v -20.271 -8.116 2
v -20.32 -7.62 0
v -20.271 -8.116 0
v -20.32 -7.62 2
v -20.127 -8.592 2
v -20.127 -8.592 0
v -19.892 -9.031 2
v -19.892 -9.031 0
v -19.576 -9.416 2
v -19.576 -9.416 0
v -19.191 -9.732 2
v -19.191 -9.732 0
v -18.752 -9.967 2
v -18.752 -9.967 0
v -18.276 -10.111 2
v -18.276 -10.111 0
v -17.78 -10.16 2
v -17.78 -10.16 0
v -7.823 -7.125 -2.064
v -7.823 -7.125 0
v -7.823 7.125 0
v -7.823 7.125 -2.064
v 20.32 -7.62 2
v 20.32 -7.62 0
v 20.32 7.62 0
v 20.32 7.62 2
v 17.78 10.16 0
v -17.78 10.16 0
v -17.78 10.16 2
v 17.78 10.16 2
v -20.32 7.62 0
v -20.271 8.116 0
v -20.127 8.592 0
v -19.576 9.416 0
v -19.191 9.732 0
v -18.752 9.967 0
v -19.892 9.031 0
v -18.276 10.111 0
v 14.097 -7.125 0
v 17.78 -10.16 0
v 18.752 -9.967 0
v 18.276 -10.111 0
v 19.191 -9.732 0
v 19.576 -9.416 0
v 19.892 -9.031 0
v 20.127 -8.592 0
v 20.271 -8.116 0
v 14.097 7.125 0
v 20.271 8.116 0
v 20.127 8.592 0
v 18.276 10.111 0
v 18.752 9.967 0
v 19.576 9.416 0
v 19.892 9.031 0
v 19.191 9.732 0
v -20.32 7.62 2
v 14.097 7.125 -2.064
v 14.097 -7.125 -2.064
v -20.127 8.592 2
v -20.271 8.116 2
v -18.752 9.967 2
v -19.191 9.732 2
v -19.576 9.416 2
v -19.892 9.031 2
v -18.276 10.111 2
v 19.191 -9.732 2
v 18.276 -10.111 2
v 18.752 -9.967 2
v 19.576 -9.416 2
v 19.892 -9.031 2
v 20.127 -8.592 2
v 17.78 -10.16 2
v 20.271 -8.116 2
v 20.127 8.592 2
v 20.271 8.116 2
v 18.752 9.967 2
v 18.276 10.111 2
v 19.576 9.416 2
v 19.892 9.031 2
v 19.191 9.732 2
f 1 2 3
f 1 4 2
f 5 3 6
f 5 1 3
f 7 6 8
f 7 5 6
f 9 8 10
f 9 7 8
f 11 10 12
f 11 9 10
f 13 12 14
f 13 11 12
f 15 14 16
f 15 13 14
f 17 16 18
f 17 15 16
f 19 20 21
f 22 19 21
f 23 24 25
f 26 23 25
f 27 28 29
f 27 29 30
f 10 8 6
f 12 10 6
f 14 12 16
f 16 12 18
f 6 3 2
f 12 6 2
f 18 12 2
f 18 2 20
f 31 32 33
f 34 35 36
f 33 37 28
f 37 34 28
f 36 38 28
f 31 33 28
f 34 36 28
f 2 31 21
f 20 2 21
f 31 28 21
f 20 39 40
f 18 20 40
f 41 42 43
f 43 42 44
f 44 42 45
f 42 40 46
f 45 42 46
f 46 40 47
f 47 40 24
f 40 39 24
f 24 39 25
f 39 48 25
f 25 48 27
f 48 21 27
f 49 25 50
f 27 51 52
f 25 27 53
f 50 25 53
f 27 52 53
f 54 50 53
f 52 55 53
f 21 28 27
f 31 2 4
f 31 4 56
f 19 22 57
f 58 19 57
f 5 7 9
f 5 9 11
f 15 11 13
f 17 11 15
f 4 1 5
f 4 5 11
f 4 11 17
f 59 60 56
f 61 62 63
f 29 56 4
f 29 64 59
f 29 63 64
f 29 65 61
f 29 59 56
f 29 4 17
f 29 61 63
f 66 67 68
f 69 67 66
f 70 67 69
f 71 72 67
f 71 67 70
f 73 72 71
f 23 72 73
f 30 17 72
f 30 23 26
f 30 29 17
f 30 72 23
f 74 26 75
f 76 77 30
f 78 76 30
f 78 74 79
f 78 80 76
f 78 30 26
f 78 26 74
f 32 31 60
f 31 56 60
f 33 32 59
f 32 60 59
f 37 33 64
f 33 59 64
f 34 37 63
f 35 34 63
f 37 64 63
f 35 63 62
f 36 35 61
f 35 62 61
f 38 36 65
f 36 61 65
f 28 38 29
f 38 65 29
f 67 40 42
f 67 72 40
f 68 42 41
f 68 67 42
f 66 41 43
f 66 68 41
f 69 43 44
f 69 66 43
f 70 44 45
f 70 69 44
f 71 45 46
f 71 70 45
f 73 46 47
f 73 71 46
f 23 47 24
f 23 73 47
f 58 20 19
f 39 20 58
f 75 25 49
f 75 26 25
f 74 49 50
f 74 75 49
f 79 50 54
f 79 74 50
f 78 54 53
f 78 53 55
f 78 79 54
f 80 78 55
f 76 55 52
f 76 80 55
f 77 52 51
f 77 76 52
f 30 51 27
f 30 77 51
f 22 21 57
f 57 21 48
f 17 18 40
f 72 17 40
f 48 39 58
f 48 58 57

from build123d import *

# Parameters (mm, degrees)
SKETCH1_W           = 40.64
SKETCH1_H           = 20.32
BOSS_EXTRUDE1_DEPTH = 2
FILLET1_R           = 2.54
SKETCH3_W           = 21.9202
SKETCH3_H           = 14.2494
BOSS_EXTRUDE3_DEPTH = 2.064


with BuildPart() as part:
    # Sketch1 → Boss-Extrude1 (new body)
    with BuildSketch(Plane.XY):
        Rectangle(SKETCH1_W, SKETCH1_H)
    extrude(amount=BOSS_EXTRUDE1_DEPTH)

    # Fillet1
    fillet1_edges = [part.edges().sort_by_distance(p)[0] for p in [
        (20.32, -10.16, 1),
        (-20.32, -10.16, 1),
        (-20.32, 10.16, 1),
        (20.32, 10.16, 1),
    ]]
    fillet(fillet1_edges, radius=FILLET1_R)

    # Sketch3 → Boss-Extrude3 (add)
    with BuildSketch(Plane.XY):
        with Locations((3.1369, 0)):
            Rectangle(SKETCH3_W, SKETCH3_H)
    extrude(amount=-BOSS_EXTRUDE3_DEPTH)


solid = part.part
